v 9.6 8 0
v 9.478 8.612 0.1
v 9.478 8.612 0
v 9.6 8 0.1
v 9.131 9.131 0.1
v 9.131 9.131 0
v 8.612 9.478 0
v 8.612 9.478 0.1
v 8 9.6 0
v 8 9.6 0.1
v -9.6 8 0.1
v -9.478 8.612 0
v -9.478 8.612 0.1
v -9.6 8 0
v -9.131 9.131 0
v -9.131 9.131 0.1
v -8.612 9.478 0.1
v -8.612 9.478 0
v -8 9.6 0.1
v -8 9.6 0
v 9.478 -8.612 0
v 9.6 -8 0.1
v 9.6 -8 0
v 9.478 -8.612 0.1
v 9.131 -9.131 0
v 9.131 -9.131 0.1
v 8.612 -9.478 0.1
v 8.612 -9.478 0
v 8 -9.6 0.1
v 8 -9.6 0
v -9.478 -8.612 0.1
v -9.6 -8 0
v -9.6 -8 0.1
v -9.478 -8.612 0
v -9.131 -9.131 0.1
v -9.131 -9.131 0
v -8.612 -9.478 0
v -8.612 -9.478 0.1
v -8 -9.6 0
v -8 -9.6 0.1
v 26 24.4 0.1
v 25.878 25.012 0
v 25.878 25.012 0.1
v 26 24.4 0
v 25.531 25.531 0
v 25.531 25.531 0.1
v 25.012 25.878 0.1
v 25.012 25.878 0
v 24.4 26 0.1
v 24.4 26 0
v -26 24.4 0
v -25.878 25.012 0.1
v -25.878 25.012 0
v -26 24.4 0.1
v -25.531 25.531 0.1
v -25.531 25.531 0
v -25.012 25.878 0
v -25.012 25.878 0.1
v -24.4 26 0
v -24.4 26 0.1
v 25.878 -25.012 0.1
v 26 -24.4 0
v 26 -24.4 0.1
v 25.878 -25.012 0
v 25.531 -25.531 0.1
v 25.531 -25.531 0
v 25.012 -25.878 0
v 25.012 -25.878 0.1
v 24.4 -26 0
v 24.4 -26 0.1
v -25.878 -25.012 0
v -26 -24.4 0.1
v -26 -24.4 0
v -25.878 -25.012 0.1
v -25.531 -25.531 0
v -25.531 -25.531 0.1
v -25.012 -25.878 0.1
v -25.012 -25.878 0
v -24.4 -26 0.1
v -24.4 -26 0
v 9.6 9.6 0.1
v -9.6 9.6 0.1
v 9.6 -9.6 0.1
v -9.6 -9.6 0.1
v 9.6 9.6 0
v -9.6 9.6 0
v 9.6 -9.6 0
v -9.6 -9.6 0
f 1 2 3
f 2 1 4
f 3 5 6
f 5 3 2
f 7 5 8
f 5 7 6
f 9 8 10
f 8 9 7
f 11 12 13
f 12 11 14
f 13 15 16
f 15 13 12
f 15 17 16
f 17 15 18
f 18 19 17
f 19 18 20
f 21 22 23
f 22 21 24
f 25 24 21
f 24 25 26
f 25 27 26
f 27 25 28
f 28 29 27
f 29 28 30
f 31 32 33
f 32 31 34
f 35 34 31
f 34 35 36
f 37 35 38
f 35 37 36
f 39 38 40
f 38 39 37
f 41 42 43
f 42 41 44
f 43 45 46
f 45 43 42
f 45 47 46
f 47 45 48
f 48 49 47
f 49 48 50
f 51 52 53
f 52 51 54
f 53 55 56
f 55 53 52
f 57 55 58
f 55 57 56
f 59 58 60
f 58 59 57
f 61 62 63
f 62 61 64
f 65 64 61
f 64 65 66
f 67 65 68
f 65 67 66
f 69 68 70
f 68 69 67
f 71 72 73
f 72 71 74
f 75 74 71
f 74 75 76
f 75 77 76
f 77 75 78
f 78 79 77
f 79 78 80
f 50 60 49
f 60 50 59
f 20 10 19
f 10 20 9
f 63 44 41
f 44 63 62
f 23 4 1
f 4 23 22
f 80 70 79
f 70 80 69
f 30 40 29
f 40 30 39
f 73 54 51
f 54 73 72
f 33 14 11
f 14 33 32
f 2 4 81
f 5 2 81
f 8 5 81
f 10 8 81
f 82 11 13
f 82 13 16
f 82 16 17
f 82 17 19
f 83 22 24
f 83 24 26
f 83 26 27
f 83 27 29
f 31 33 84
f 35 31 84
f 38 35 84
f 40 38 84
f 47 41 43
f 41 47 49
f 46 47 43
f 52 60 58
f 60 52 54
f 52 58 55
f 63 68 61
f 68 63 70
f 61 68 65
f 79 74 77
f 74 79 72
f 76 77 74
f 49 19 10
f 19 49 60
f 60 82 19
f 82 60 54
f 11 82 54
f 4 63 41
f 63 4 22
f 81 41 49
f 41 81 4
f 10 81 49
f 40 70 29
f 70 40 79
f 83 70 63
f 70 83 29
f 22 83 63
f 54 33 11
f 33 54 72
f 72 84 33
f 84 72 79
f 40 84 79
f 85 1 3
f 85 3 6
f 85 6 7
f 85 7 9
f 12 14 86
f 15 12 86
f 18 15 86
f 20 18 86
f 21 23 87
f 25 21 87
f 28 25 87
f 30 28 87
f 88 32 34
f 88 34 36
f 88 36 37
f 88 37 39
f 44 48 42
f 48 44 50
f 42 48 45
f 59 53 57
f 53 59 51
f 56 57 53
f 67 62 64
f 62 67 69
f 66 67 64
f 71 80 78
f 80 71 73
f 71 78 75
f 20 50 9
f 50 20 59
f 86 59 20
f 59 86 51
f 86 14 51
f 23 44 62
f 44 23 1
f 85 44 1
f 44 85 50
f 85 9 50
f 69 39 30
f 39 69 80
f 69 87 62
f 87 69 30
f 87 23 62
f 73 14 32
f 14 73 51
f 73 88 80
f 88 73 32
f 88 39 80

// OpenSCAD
// file: ../p/4-4edge.scad
use <../lib.scad>
$fa=1; $fs=0.2;
function ldraw_lib__4_4edge(realsolid=false) = [
// 0 Circle 1.0
// 0 Name: 4-4edge.dat
// 0 Author: James Jessiman
// 0 !LDRAW_ORG Primitive UPDATE 2017-01
// 0 !LICENSE Licensed under CC BY 2.0 and CC BY 4.0 : see CAreadme.txt
// 
// 0 BFC CERTIFY CCW
  [0,"BFC","CERTIFY"],
  [0,"BFC","CCW"],
// 
// 0 !HISTORY 1998-12-15 [PTadmin] Official Update 1998-10
// 0 !HISTORY 2005-12-28 [PTadmin] Official Update 2005-01
// 0 !HISTORY 2007-06-24 [PTadmin] Header formatted for Contributor Agreement
// 0 !HISTORY 2008-07-01 [PTadmin] Official Update 2008-01
// 0 !HISTORY 2017-01-15 [Steffen] BFCed
// 0 !HISTORY 2017-12-30 [PTadmin] Official Update 2017-01
// 
// 
// 2 24 1 0 0 0.9239 0 0.3827
  [2,24,1,0,0,0.9239,0,0.3827],
// 2 24 0.9239 0 0.3827 0.7071 0 0.7071
  [2,24,0.9239,0,0.3827,0.7071,0,0.7071],
// 2 24 0.7071 0 0.7071 0.3827 0 0.9239
  [2,24,0.7071,0,0.7071,0.3827,0,0.9239],
// 2 24 0.3827 0 0.9239 0 0 1
  [2,24,0.3827,0,0.9239,0,0,1],
// 2 24 0 0 1 -0.3827 0 0.9239
  [2,24,0,0,1,-0.3827,0,0.9239],
// 2 24 -0.3827 0 0.9239 -0.7071 0 0.7071
  [2,24,-0.3827,0,0.9239,-0.7071,0,0.7071],
// 2 24 -0.7071 0 0.7071 -0.9239 0 0.3827
  [2,24,-0.7071,0,0.7071,-0.9239,0,0.3827],
// 2 24 -0.9239 0 0.3827 -1 0 -0
  [2,24,-0.9239,0,0.3827,-1,0,-0],
// 2 24 -1 0 -0 -0.9239 0 -0.3827
  [2,24,-1,0,-0,-0.9239,0,-0.3827],
// 2 24 -0.9239 0 -0.3827 -0.7071 0 -0.7071
  [2,24,-0.9239,0,-0.3827,-0.7071,0,-0.7071],
// 2 24 -0.7071 0 -0.7071 -0.3827 0 -0.9239
  [2,24,-0.7071,0,-0.7071,-0.3827,0,-0.9239],
// 2 24 -0.3827 0 -0.9239 0 0 -1
  [2,24,-0.3827,0,-0.9239,0,0,-1],
// 2 24 0 0 -1 0.3827 0 -0.9239
  [2,24,0,0,-1,0.3827,0,-0.9239],
// 2 24 0.3827 0 -0.9239 0.7071 0 -0.7071
  [2,24,0.3827,0,-0.9239,0.7071,0,-0.7071],
// 2 24 0.7071 0 -0.7071 0.9239 0 -0.3827
  [2,24,0.7071,0,-0.7071,0.9239,0,-0.3827],
// 2 24 0.9239 0 -0.3827 1 0 0
  [2,24,0.9239,0,-0.3827,1,0,0],
];
module ldraw_lib__4_4edge(step=0, col=false, unit=2/5, alt=false, line=0.2, solid=!$preview)
    makepoly(ldraw_lib__4_4edge(solid), step=step, col=col, unit=unit, alt=alt, line=line, solid=solid);
ldraw_lib__4_4edge(line=0.2);
// file: ../p/4-4disc.scad
use <../lib.scad>
$fa=1; $fs=0.2;
function ldraw_lib__4_4disc(realsolid=false) = [
// 0 Disc 1.0
// 0 Name: 4-4disc.dat
// 0 Author: James Jessiman
// 0 !LDRAW_ORG Primitive UPDATE 2002-02
// 0 !LICENSE Licensed under CC BY 2.0 and CC BY 4.0 : see CAreadme.txt
// 
// 0 BFC CERTIFY CCW
  [0,"BFC","CERTIFY"],
  [0,"BFC","CCW"],
// 
// 0 !HISTORY 1998-12-15 [PTadmin] Official Update 1998-10
// 0 !HISTORY 2002-03-23 [sbliss] Added BFC statement
// 0 !HISTORY 2002-04-25 [PTadmin] Official Update 2002-02
// 0 !HISTORY 2007-06-24 [PTadmin] Header formatted for Contributor Agreement
// 0 !HISTORY 2008-07-01 [PTadmin] Official Update 2008-01
// 
// 
// 3 16 0 0 0 1 0 0 0.9239 0 0.3827
  [3,16,0,0,0,1,0,0,0.9239,0,0.3827],
// 3 16 0 0 0 0.9239 0 0.3827 0.7071 0 0.7071
  [3,16,0,0,0,0.9239,0,0.3827,0.7071,0,0.7071],
// 3 16 0 0 0 0.7071 0 0.7071 0.3827 0 0.9239
  [3,16,0,0,0,0.7071,0,0.7071,0.3827,0,0.9239],
// 3 16 0 0 0 0.3827 0 0.9239 0 0 1
  [3,16,0,0,0,0.3827,0,0.9239,0,0,1],
// 3 16 0 0 0 0 0 1 -0.3827 0 0.9239
  [3,16,0,0,0,0,0,1,-0.3827,0,0.9239],
// 3 16 0 0 0 -0.3827 0 0.9239 -0.7071 0 0.7071
  [3,16,0,0,0,-0.3827,0,0.9239,-0.7071,0,0.7071],
// 3 16 0 0 0 -0.7071 0 0.7071 -0.9239 0 0.3827
  [3,16,0,0,0,-0.7071,0,0.7071,-0.9239,0,0.3827],
// 3 16 0 0 0 -0.9239 0 0.3827 -1 0 -0
  [3,16,0,0,0,-0.9239,0,0.3827,-1,0,-0],
// 3 16 0 0 0 -1 0 -0 -0.9239 0 -0.3827
  [3,16,0,0,0,-1,0,-0,-0.9239,0,-0.3827],
// 3 16 0 0 0 -0.9239 0 -0.3827 -0.7071 0 -0.7071
  [3,16,0,0,0,-0.9239,0,-0.3827,-0.7071,0,-0.7071],
// 3 16 0 0 0 -0.7071 0 -0.7071 -0.3827 0 -0.9239
  [3,16,0,0,0,-0.7071,0,-0.7071,-0.3827,0,-0.9239],
// 3 16 0 0 0 -0.3827 0 -0.9239 0 0 -1
  [3,16,0,0,0,-0.3827,0,-0.9239,0,0,-1],
// 3 16 0 0 0 0 0 -1 0.3827 0 -0.9239
  [3,16,0,0,0,0,0,-1,0.3827,0,-0.9239],
// 3 16 0 0 0 0.3827 0 -0.9239 0.7071 0 -0.7071
  [3,16,0,0,0,0.3827,0,-0.9239,0.7071,0,-0.7071],
// 3 16 0 0 0 0.7071 0 -0.7071 0.9239 0 -0.3827
  [3,16,0,0,0,0.7071,0,-0.7071,0.9239,0,-0.3827],
// 3 16 0 0 0 0.9239 0 -0.3827 1 0 0
  [3,16,0,0,0,0.9239,0,-0.3827,1,0,0],
// 0
];
module ldraw_lib__4_4disc(step=0, col=false, unit=2/5, alt=false, line=0.2, solid=!$preview)
    makepoly(ldraw_lib__4_4disc(solid), step=step, col=col, unit=unit, alt=alt, line=line, solid=solid);
ldraw_lib__4_4disc(line=0.2);
// file: ../p/4-4cyli.scad
use <../lib.scad>
$fa=1; $fs=0.2;
function ldraw_lib__4_4cyli(realsolid=false) = [
// 0 Cylinder 1.0
// 0 Name: 4-4cyli.dat
// 0 Author: James Jessiman
// 0 !LDRAW_ORG Primitive UPDATE 2005-01
// 0 !LICENSE Licensed under CC BY 2.0 and CC BY 4.0 : see CAreadme.txt
// 
// 0 BFC CERTIFY CCW
  [0,"BFC","CERTIFY"],
  [0,"BFC","CCW"],
// 
// 0 !HISTORY 1998-12-15 [PTadmin] Official Update 1998-10
// 0 !HISTORY 2002-03-23 [sbliss] Added BFC statement; merged headers from files in distributions LDraw 0.27 and Complete.
// 0 !HISTORY 2002-04-25 [PTadmin] Official Update 2002-02
// 0 !HISTORY 2004-12-14 [guyvivan] BFC CCW
// 0 !HISTORY 2005-12-28 [PTadmin] Official Update 2005-01
// 0 !HISTORY 2007-06-24 [PTadmin] Header formatted for Contributor Agreement
// 0 !HISTORY 2008-07-01 [PTadmin] Official Update 2008-01
// 
// 
// 4 16 1 1 0 0.9239 1 0.3827 0.9239 0 0.3827 1 0 0
  [4,16,1,1,0,0.9239,1,0.3827,0.9239,0,0.3827,1,0,0],
// 5 24 1 0 0 1 1 0 0.9239 0 0.3827 0.9239 0 -0.3827
  [5,24,1,0,0,1,1,0,0.9239,0,0.3827,0.9239,0,-0.3827],
// 4 16 0.9239 1 0.3827 0.7071 1 0.7071 0.7071 0 0.7071 0.9239 0 0.3827
  [4,16,0.9239,1,0.3827,0.7071,1,0.7071,0.7071,0,0.7071,0.9239,0,0.3827],
// 5 24 0.9239 0 0.3827 0.9239 1 0.3827 0.7071 0 0.7071 1 0 0
  [5,24,0.9239,0,0.3827,0.9239,1,0.3827,0.7071,0,0.7071,1,0,0],
// 4 16 0.7071 1 0.7071 0.3827 1 0.9239 0.3827 0 0.9239 0.7071 0 0.7071
  [4,16,0.7071,1,0.7071,0.3827,1,0.9239,0.3827,0,0.9239,0.7071,0,0.7071],
// 5 24 0.7071 0 0.7071 0.7071 1 0.7071 0.3827 0 0.9239 0.9239 0 0.3827
  [5,24,0.7071,0,0.7071,0.7071,1,0.7071,0.3827,0,0.9239,0.9239,0,0.3827],
// 4 16 0.3827 1 0.9239 0 1 1 0 0 1 0.3827 0 0.9239
  [4,16,0.3827,1,0.9239,0,1,1,0,0,1,0.3827,0,0.9239],
// 5 24 0.3827 0 0.9239 0.3827 1 0.9239 0 0 1 0.7071 0 0.7071
  [5,24,0.3827,0,0.9239,0.3827,1,0.9239,0,0,1,0.7071,0,0.7071],
// 4 16 0 1 1 -0.3827 1 0.9239 -0.3827 0 0.9239 0 0 1
  [4,16,0,1,1,-0.3827,1,0.9239,-0.3827,0,0.9239,0,0,1],
// 5 24 0 0 1 0 1 1 -0.3827 0 0.9239 0.3827 0 0.9239
  [5,24,0,0,1,0,1,1,-0.3827,0,0.9239,0.3827,0,0.9239],
// 4 16 -0.3827 1 0.9239 -0.7071 1 0.7071 -0.7071 0 0.7071 -0.3827 0 0.9239
  [4,16,-0.3827,1,0.9239,-0.7071,1,0.7071,-0.7071,0,0.7071,-0.3827,0,0.9239],
// 5 24 -0.3827 0 0.9239 -0.3827 1 0.9239 -0.7071 0 0.7071 0 0 1
  [5,24,-0.3827,0,0.9239,-0.3827,1,0.9239,-0.7071,0,0.7071,0,0,1],
// 4 16 -0.7071 1 0.7071 -0.9239 1 0.3827 -0.9239 0 0.3827 -0.7071 0 0.7071
  [4,16,-0.7071,1,0.7071,-0.9239,1,0.3827,-0.9239,0,0.3827,-0.7071,0,0.7071],
// 5 24 -0.7071 0 0.7071 -0.7071 1 0.7071 -0.9239 0 0.3827 -0.3827 0 0.9239
  [5,24,-0.7071,0,0.7071,-0.7071,1,0.7071,-0.9239,0,0.3827,-0.3827,0,0.9239],
// 4 16 -0.9239 1 0.3827 -1 1 0 -1 0 0 -0.9239 0 0.3827
  [4,16,-0.9239,1,0.3827,-1,1,0,-1,0,0,-0.9239,0,0.3827],
// 5 24 -0.9239 0 0.3827 -0.9239 1 0.3827 -1 0 0 -0.7071 0 0.7071
  [5,24,-0.9239,0,0.3827,-0.9239,1,0.3827,-1,0,0,-0.7071,0,0.7071],
// 4 16 -1 1 0 -0.9239 1 -0.3827 -0.9239 0 -0.3827 -1 0 0
  [4,16,-1,1,0,-0.9239,1,-0.3827,-0.9239,0,-0.3827,-1,0,0],
// 5 24 -1 0 0 -1 1 0 -0.9239 0 -0.3827 -0.9239 0 0.3827
  [5,24,-1,0,0,-1,1,0,-0.9239,0,-0.3827,-0.9239,0,0.3827],
// 4 16 -0.9239 1 -0.3827 -0.7071 1 -0.7071 -0.7071 0 -0.7071 -0.9239 0 -0.3827
  [4,16,-0.9239,1,-0.3827,-0.7071,1,-0.7071,-0.7071,0,-0.7071,-0.9239,0,-0.3827],
// 5 24 -0.9239 0 -0.3827 -0.9239 1 -0.3827 -0.7071 0 -0.7071 -1 0 0
  [5,24,-0.9239,0,-0.3827,-0.9239,1,-0.3827,-0.7071,0,-0.7071,-1,0,0],
// 4 16 -0.7071 1 -0.7071 -0.3827 1 -0.9239 -0.3827 0 -0.9239 -0.7071 0 -0.7071
  [4,16,-0.7071,1,-0.7071,-0.3827,1,-0.9239,-0.3827,0,-0.9239,-0.7071,0,-0.7071],
// 5 24 -0.7071 0 -0.7071 -0.7071 1 -0.7071 -0.3827 0 -0.9239 -0.9239 0 -0.3827
  [5,24,-0.7071,0,-0.7071,-0.7071,1,-0.7071,-0.3827,0,-0.9239,-0.9239,0,-0.3827],
// 4 16 -0.3827 1 -0.9239 0 1 -1 0 0 -1 -0.3827 0 -0.9239
  [4,16,-0.3827,1,-0.9239,0,1,-1,0,0,-1,-0.3827,0,-0.9239],
// 5 24 -0.3827 0 -0.9239 -0.3827 1 -0.9239 0 0 -1 -0.7071 0 -0.7071
  [5,24,-0.3827,0,-0.9239,-0.3827,1,-0.9239,0,0,-1,-0.7071,0,-0.7071],
// 4 16 0 1 -1 0.3827 1 -0.9239 0.3827 0 -0.9239 0 0 -1
  [4,16,0,1,-1,0.3827,1,-0.9239,0.3827,0,-0.9239,0,0,-1],
// 5 24 0 0 -1 0 1 -1 0.3827 0 -0.9239 -0.3827 0 -0.9239
  [5,24,0,0,-1,0,1,-1,0.3827,0,-0.9239,-0.3827,0,-0.9239],
// 4 16 0.3827 1 -0.9239 0.7071 1 -0.7071 0.7071 0 -0.7071 0.3827 0 -0.9239
  [4,16,0.3827,1,-0.9239,0.7071,1,-0.7071,0.7071,0,-0.7071,0.3827,0,-0.9239],
// 5 24 0.3827 0 -0.9239 0.3827 1 -0.9239 0.7071 0 -0.7071 0 0 -1
  [5,24,0.3827,0,-0.9239,0.3827,1,-0.9239,0.7071,0,-0.7071,0,0,-1],
// 4 16 0.7071 1 -0.7071 0.9239 1 -0.3827 0.9239 0 -0.3827 0.7071 0 -0.7071
  [4,16,0.7071,1,-0.7071,0.9239,1,-0.3827,0.9239,0,-0.3827,0.7071,0,-0.7071],
// 5 24 0.7071 0 -0.7071 0.7071 1 -0.7071 0.9239 0 -0.3827 0.3827 0 -0.9239
  [5,24,0.7071,0,-0.7071,0.7071,1,-0.7071,0.9239,0,-0.3827,0.3827,0,-0.9239],
// 4 16 0.9239 1 -0.3827 1 1 0 1 0 0 0.9239 0 -0.3827
  [4,16,0.9239,1,-0.3827,1,1,0,1,0,0,0.9239,0,-0.3827],
// 5 24 0.9239 0 -0.3827 0.9239 1 -0.3827 1 0 0 0.7071 0 -0.7071
  [5,24,0.9239,0,-0.3827,0.9239,1,-0.3827,1,0,0,0.7071,0,-0.7071],
// 0
];
module ldraw_lib__4_4cyli(step=0, col=false, unit=2/5, alt=false, line=0.2, solid=!$preview)
    makepoly(ldraw_lib__4_4cyli(solid), step=step, col=col, unit=unit, alt=alt, line=line, solid=solid);
ldraw_lib__4_4cyli(line=0.2);
// file: ../p/stud3.scad
use <../lib.scad>
use <4-4cyli.scad>
use <4-4disc.scad>
use <4-4edge.scad>
$fa=1; $fs=0.2;
function ldraw_lib__stud3(realsolid=false) = realsolid ? 
    [openscad(translate([0,0,-eps()], o=cylinder(4+eps(), r=4)),2)] : [
// 0 Stud Tube Solid
// 0 Name: stud3.dat
// 0 Author: James Jessiman
// 0 !LDRAW_ORG Primitive UPDATE 2012-01
// 0 !LICENSE Licensed under CC BY 2.0 and CC BY 4.0 : see CAreadme.txt
// 
// 0 BFC CERTIFY CCW
  [0,"BFC","CERTIFY"],
  [0,"BFC","CCW"],
// 
// 0 !HISTORY 2002-04-04 [sbliss] Modified for BFC compliance
// 0 !HISTORY 2002-04-25 [PTadmin] Official Update 2002-02
// 0 !HISTORY 2007-06-24 [PTadmin] Header formatted for Contributor Agreement
// 0 !HISTORY 2008-07-01 [PTadmin] Official Update 2008-01
// 0 !HISTORY 2012-02-16 [Philo] Changed to CCW
// 0 !HISTORY 2012-03-30 [PTadmin] Official Update 2012-01
// 
// 
// 1 16 0 -4 0 4 0 0 0 1 0 0 0 4 4-4edge.dat
  [1,16,0,-4,0,4,0,0,0,1,0,0,0,4, ldraw_lib__4_4edge(realsolid)],
// 1 16 0 0 0 4 0 0 0 1 0 0 0 4 4-4edge.dat
  [1,16,0,0,0,4,0,0,0,1,0,0,0,4, ldraw_lib__4_4edge(realsolid)],
// 1 16 0 -4 0 4 0 0 0 1 0 0 0 4 4-4disc.dat
  [1,16,0,-4,0,4,0,0,0,1,0,0,0,4, ldraw_lib__4_4disc(realsolid)],
// 1 16 0 -4 0 4 0 0 0 4 0 0 0 4 4-4cyli.dat
  [1,16,0,-4,0,4,0,0,0,4,0,0,0,4, ldraw_lib__4_4cyli(realsolid)],
];
module ldraw_lib__stud3(step=0, col=false, unit=2/5, alt=false, line=0.2, solid=!$preview)
    makepoly(ldraw_lib__stud3(solid), step=step, col=col, unit=unit, alt=alt, line=line, solid=solid);
ldraw_lib__stud3(line=0.2);
// file: ../p/stud.scad
use <../lib.scad>
use <4-4cyli.scad>
use <4-4disc.scad>
use <4-4edge.scad>
$fa=1; $fs=0.2;
function ldraw_lib__stud(realsolid=false) = realsolid ? 
    [openscad(translate([0,0,-eps()], o=cylinder(4+eps(), r=6)),2)] : [
// 0 Stud
// 0 Name: stud.dat
// 0 Author: James Jessiman
// 0 !LDRAW_ORG Primitive UPDATE 2012-01
// 0 !LICENSE Licensed under CC BY 2.0 and CC BY 4.0 : see CAreadme.txt
// 
// 0 BFC CERTIFY CCW
  [0,"BFC","CERTIFY"],
  [0,"BFC","CCW"],
// 
// 0 !HISTORY 2002-04-04 [sbliss] Modified for BFC compliance
// 0 !HISTORY 2002-04-25 [PTadmin] Official Update 2002-02
// 0 !HISTORY 2007-06-24 [PTadmin] Header formatted for Contributor Agreement
// 0 !HISTORY 2008-07-01 [PTadmin] Official Update 2008-01
// 0 !HISTORY 2012-02-16 [Philo] Changed to CCW
// 0 !HISTORY 2012-03-30 [PTadmin] Official Update 2012-01
// 
// 
// 1 16 0 0 0 6 0 0 0 1 0 0 0 6 4-4edge.dat
  [1,16,0,0,0,6,0,0,0,1,0,0,0,6, ldraw_lib__4_4edge(realsolid)],
// 1 16 0 -4 0 6 0 0 0 1 0 0 0 6 4-4edge.dat
  [1,16,0,-4,0,6,0,0,0,1,0,0,0,6, ldraw_lib__4_4edge(realsolid)],
// 1 16 0 0 0 6 0 0 0 -4 0 0 0 6 4-4cyli.dat
  [1,16,0,0,0,6,0,0,0,-4,0,0,0,6, ldraw_lib__4_4cyli(realsolid)],
// 1 16 0 -4 0 6 0 0 0 1 0 0 0 6 4-4disc.dat
  [1,16,0,-4,0,6,0,0,0,1,0,0,0,6, ldraw_lib__4_4disc(realsolid)],
];
module ldraw_lib__stud(step=0, col=false, unit=2/5, alt=false, line=0.2, solid=!$preview)
    makepoly(ldraw_lib__stud(solid), step=step, col=col, unit=unit, alt=alt, line=line, solid=solid);
ldraw_lib__stud(line=0.2);
// file: ../p/box5.scad
use <../lib.scad>
$fa=1; $fs=0.2;
function ldraw_lib__box5(realsolid=false) = [
// 0 Box with 5 Faces and All Edges
// 0 Name: box5.dat
// 0 Author: James Jessiman
// 0 !LDRAW_ORG Primitive UPDATE 2012-01
// 0 !LICENSE Licensed under CC BY 2.0 and CC BY 4.0 : see CAreadme.txt
// 
// 0 BFC CERTIFY CCW
  [0,"BFC","CERTIFY"],
  [0,"BFC","CCW"],
// 
// 0 !HISTORY 2002-04-03 [sbliss] Modified for BFC compliance
// 0 !HISTORY 2002-04-25 [PTadmin] Official Update 2002-02
// 0 !HISTORY 2007-06-24 [PTadmin] Header formatted for Contributor Agreement
// 0 !HISTORY 2008-07-01 [PTadmin] Official Update 2008-01
// 0 !HISTORY 2012-02-16 [Philo] Changed to CCW
// 0 !HISTORY 2012-03-30 [PTadmin] Official Update 2012-01
// 
// 
// 2 24 1 1 1 -1 1 1
  [2,24,1,1,1,-1,1,1],
// 2 24 -1 1 1 -1 1 -1
  [2,24,-1,1,1,-1,1,-1],
// 2 24 -1 1 -1 1 1 -1
  [2,24,-1,1,-1,1,1,-1],
// 2 24 1 1 -1 1 1 1
  [2,24,1,1,-1,1,1,1],
// 2 24 1 0 1 -1 0 1
  [2,24,1,0,1,-1,0,1],
// 2 24 -1 0 1 -1 0 -1
  [2,24,-1,0,1,-1,0,-1],
// 2 24 -1 0 -1 1 0 -1
  [2,24,-1,0,-1,1,0,-1],
// 2 24 1 0 -1 1 0 1
  [2,24,1,0,-1,1,0,1],
// 2 24 1 0 1 1 1 1
  [2,24,1,0,1,1,1,1],
// 2 24 -1 0 1 -1 1 1
  [2,24,-1,0,1,-1,1,1],
// 2 24 1 0 -1 1 1 -1
  [2,24,1,0,-1,1,1,-1],
// 2 24 -1 0 -1 -1 1 -1
  [2,24,-1,0,-1,-1,1,-1],
// 4 16 -1 1 1 1 1 1 1 1 -1 -1 1 -1
  [4,16,-1,1,1,1,1,1,1,1,-1,-1,1,-1],
// 4 16 -1 1 1 -1 0 1 1 0 1 1 1 1
  [4,16,-1,1,1,-1,0,1,1,0,1,1,1,1],
// 4 16 -1 1 -1 -1 0 -1 -1 0 1 -1 1 1
  [4,16,-1,1,-1,-1,0,-1,-1,0,1,-1,1,1],
// 4 16 1 1 -1 1 0 -1 -1 0 -1 -1 1 -1
  [4,16,1,1,-1,1,0,-1,-1,0,-1,-1,1,-1],
// 4 16 1 1 1 1 0 1 1 0 -1 1 1 -1
  [4,16,1,1,1,1,0,1,1,0,-1,1,1,-1],
];
module ldraw_lib__box5(step=0, col=false, unit=2/5, alt=false, line=0.2, solid=!$preview)
    makepoly(ldraw_lib__box5(solid), step=step, col=col, unit=unit, alt=alt, line=line, solid=solid);
ldraw_lib__box5(line=0.2);
// file: ../p/box4t.scad
use <../lib.scad>
$fa=1; $fs=0.2;
function ldraw_lib__box4t(realsolid=false) = [
// 0 Box with 4 Adjacent Faces and All Edges
// 0 Name: box4t.dat
// 0 Author: Tore Eriksson [Tore_Eriksson]
// 0 !LDRAW_ORG Primitive UPDATE 2003-02
// 0 !LICENSE Licensed under CC BY 2.0 and CC BY 4.0 : see CAreadme.txt
// 
// 0 BFC CERTIFY CCW
  [0,"BFC","CERTIFY"],
  [0,"BFC","CCW"],
// 
// 0 !HISTORY 1997-09-29 [PTadmin] Official Update 1997-15
// 0 !HISTORY 2002-08-31 [izanette] Modified with WINDZ for BFC compliance
// 0 !HISTORY 2003-08-01 [PTadmin] Official Update 2003-02
// 0 !HISTORY 2007-06-24 [PTadmin] Header formatted for Contributor Agreement
// 0 !HISTORY 2008-07-01 [PTadmin] Official Update 2008-01
// 
// 
// 2 24 1 1 1 -1 1 1
  [2,24,1,1,1,-1,1,1],
// 2 24 -1 1 1 -1 1 -1
  [2,24,-1,1,1,-1,1,-1],
// 2 24 -1 1 -1 1 1 -1
  [2,24,-1,1,-1,1,1,-1],
// 2 24 1 1 -1 1 1 1
  [2,24,1,1,-1,1,1,1],
// 2 24 1 0 1 -1 0 1
  [2,24,1,0,1,-1,0,1],
// 2 24 -1 0 1 -1 0 -1
  [2,24,-1,0,1,-1,0,-1],
// 2 24 -1 0 -1 1 0 -1
  [2,24,-1,0,-1,1,0,-1],
// 2 24 1 0 -1 1 0 1
  [2,24,1,0,-1,1,0,1],
// 2 24 1 0 1 1 1 1
  [2,24,1,0,1,1,1,1],
// 2 24 -1 0 1 -1 1 1
  [2,24,-1,0,1,-1,1,1],
// 2 24 1 0 -1 1 1 -1
  [2,24,1,0,-1,1,1,-1],
// 2 24 -1 0 -1 -1 1 -1
  [2,24,-1,0,-1,-1,1,-1],
// 4 16 1 1 1 1 1 -1 -1 1 -1 -1 1 1
  [4,16,1,1,1,1,1,-1,-1,1,-1,-1,1,1],
// 4 16 1 1 1 -1 1 1 -1 0 1 1 0 1
  [4,16,1,1,1,-1,1,1,-1,0,1,1,0,1],
// 4 16 -1 1 1 -1 1 -1 -1 0 -1 -1 0 1
  [4,16,-1,1,1,-1,1,-1,-1,0,-1,-1,0,1],
// 0 4 16 -1 1 -1 -1 0 -1 1 0 -1 1 1 -1
// 4 16 1 1 -1 1 1 1 1 0 1 1 0 -1
  [4,16,1,1,-1,1,1,1,1,0,1,1,0,-1],
// 0
];
module ldraw_lib__box4t(step=0, col=false, unit=2/5, alt=false, line=0.2, solid=!$preview)
    makepoly(ldraw_lib__box4t(solid), step=step, col=col, unit=unit, alt=alt, line=line, solid=solid);
ldraw_lib__box4t(line=0.2);
// file: s/3004s01.scad
use <../../lib.scad>
use <../../p/box4t.scad>
use <../../p/box5.scad>
use <../../p/stud.scad>
use <../../p/stud3.scad>
$fa=1; $fs=0.2;
function ldraw_lib__s__3004s01(realsolid=false) = [
// 0 ~Brick  1 x  2 without Front Face
// 0 Name: s\3004s01.dat
// 0 Author: James Jessiman
// 0 !LDRAW_ORG Subpart UPDATE 2003-03
// 0 !LICENSE Licensed under CC BY 2.0 and CC BY 4.0 : see CAreadme.txt
// 
// 0 BFC CERTIFY CCW
  [0,"BFC","CERTIFY"],
  [0,"BFC","CCW"],
// 
// 0 !HISTORY 2003-09-07 [jriley] Subfiling, BFC
// 0 !HISTORY 2003-12-19 [PTadmin] Official Update 2003-03
// 0 !HISTORY 2007-08-29 [PTadmin] Header formatted for Contributor Agreement
// 0 !HISTORY 2008-07-01 [PTadmin] Official Update 2008-01
// 
// 
// 1 16 0 4 0 1 0 0 0 -5 0 0 0 1 stud3.dat
  [1,16,0,4,0,1,0,0,0,-5,0,0,0,1, ldraw_lib__stud3(realsolid)],
// 0 BFC INVERTNEXT
  [0,"BFC","INVERTNEXT"],
// 1 16 0 24 0 16 0 0 0 -20 0 0 0 6 box5.dat
  [1,16,0,24,0,16,0,0,0,-20,0,0,0,6, ldraw_lib__box5(realsolid)],
// 4 16 20 24 10 16 24 6 -16 24 6 -20 24 10
  [4,16,20,24,10,16,24,6,-16,24,6,-20,24,10],
// 4 16 -20 24 10 -16 24 6 -16 24 -6 -20 24 -10
  [4,16,-20,24,10,-16,24,6,-16,24,-6,-20,24,-10],
// 4 16 -20 24 -10 -16 24 -6 16 24 -6 20 24 -10
  [4,16,-20,24,-10,-16,24,-6,16,24,-6,20,24,-10],
// 4 16 20 24 -10 16 24 -6 16 24 6 20 24 10
  [4,16,20,24,-10,16,24,-6,16,24,6,20,24,10],
// 1 16 0 24 0 20 0 0 0 -24 0 0 0 10 box4t.dat
  [1,16,0,24,0,20,0,0,0,-24,0,0,0,10, ldraw_lib__box4t(realsolid)],
// 1 16 10 0 0 1 0 0 0 1 0 0 0 1 stud.dat
  [1,16,10,0,0,1,0,0,0,1,0,0,0,1, ldraw_lib__stud(realsolid)],
// 1 16 -10 0 0 1 0 0 0 1 0 0 0 1 stud.dat
  [1,16,-10,0,0,1,0,0,0,1,0,0,0,1, ldraw_lib__stud(realsolid)],
// 0
];
module ldraw_lib__s__3004s01(step=0, col=false, unit=2/5, alt=false, line=0.2, solid=!$preview)
    makepoly(ldraw_lib__s__3004s01(solid), step=step, col=col, unit=unit, alt=alt, line=line, solid=solid);
ldraw_lib__s__3004s01(line=0.2);
// file: ../p/1-4edge.scad
use <../lib.scad>
$fa=1; $fs=0.2;
function ldraw_lib__1_4edge(realsolid=false) = [
// 0 Circle 0.25
// 0 Name: 1-4edge.dat
// 0 Author: James Jessiman
// 0 !LDRAW_ORG Primitive UPDATE 2017-01
// 0 !LICENSE Licensed under CC BY 2.0 and CC BY 4.0 : see CAreadme.txt
// 
// 0 BFC CERTIFY CCW
  [0,"BFC","CERTIFY"],
  [0,"BFC","CCW"],
// 
// 0 !HISTORY 2007-06-22 [PTadmin] Header formatted for Contributor Agreement
// 0 !HISTORY 2008-07-01 [PTadmin] Official Update 2008-01
// 0 !HISTORY 2017-01-15 [Steffen] BFCed
// 0 !HISTORY 2017-12-30 [PTadmin] Official Update 2017-01
// 
// 
// 2 24 1 0 0 0.9239 0 0.3827
  [2,24,1,0,0,0.9239,0,0.3827],
// 2 24 0.9239 0 0.3827 0.7071 0 0.7071
  [2,24,0.9239,0,0.3827,0.7071,0,0.7071],
// 2 24 0.7071 0 0.7071 0.3827 0 0.9239
  [2,24,0.7071,0,0.7071,0.3827,0,0.9239],
// 2 24 0.3827 0 0.9239 0 0 1
  [2,24,0.3827,0,0.9239,0,0,1],
];
module ldraw_lib__1_4edge(step=0, col=false, unit=2/5, alt=false, line=0.2, solid=!$preview)
    makepoly(ldraw_lib__1_4edge(solid), step=step, col=col, unit=unit, alt=alt, line=line, solid=solid);
ldraw_lib__1_4edge(line=0.2);
// file: ../p/1-4cyli.scad
use <../lib.scad>
$fa=1; $fs=0.2;
function ldraw_lib__1_4cyli(realsolid=false) = [
// 0 Cylinder 0.25
// 0 Name: 1-4cyli.dat
// 0 Author: James Jessiman
// 0 !LDRAW_ORG Primitive UPDATE 2012-01
// 0 !LICENSE Licensed under CC BY 2.0 and CC BY 4.0 : see CAreadme.txt
// 
// 0 BFC CERTIFY CCW
  [0,"BFC","CERTIFY"],
  [0,"BFC","CCW"],
// 
// 0 !HISTORY 2002-03-23 [sbliss] Added BFC statement.
// 0 !HISTORY 2002-04-25 [PTadmin] Official Update 2002-02
// 0 !HISTORY 2007-06-22 [PTadmin] Header formatted for Contributor Agreement
// 0 !HISTORY 2008-07-01 [PTadmin] Official Update 2008-01
// 0 !HISTORY 2012-02-16 [Philo] Changed to CCW
// 0 !HISTORY 2012-03-30 [PTadmin] Official Update 2012-01
// 
// 
// 4 16 1 1 0 0.9239 1 0.3827 0.9239 0 0.3827 1 0 0
  [4,16,1,1,0,0.9239,1,0.3827,0.9239,0,0.3827,1,0,0],
// 5 24 1 0 0 1 1 0 0.9239 0 0.3827 1 0 -1
  [5,24,1,0,0,1,1,0,0.9239,0,0.3827,1,0,-1],
// 4 16 0.9239 1 0.3827 0.7071 1 0.7071 0.7071 0 0.7071 0.9239 0 0.3827
  [4,16,0.9239,1,0.3827,0.7071,1,0.7071,0.7071,0,0.7071,0.9239,0,0.3827],
// 5 24 0.9239 0 0.3827 0.9239 1 0.3827 0.7071 0 0.7071 1 0 0
  [5,24,0.9239,0,0.3827,0.9239,1,0.3827,0.7071,0,0.7071,1,0,0],
// 4 16 0.7071 1 0.7071 0.3827 1 0.9239 0.3827 0 0.9239 0.7071 0 0.7071
  [4,16,0.7071,1,0.7071,0.3827,1,0.9239,0.3827,0,0.9239,0.7071,0,0.7071],
// 5 24 0.7071 0 0.7071 0.7071 1 0.7071 0.3827 0 0.9239 0.9239 0 0.3827
  [5,24,0.7071,0,0.7071,0.7071,1,0.7071,0.3827,0,0.9239,0.9239,0,0.3827],
// 4 16 0.3827 1 0.9239 0 1 1 0 0 1 0.3827 0 0.9239
  [4,16,0.3827,1,0.9239,0,1,1,0,0,1,0.3827,0,0.9239],
// 5 24 0.3827 0 0.9239 0.3827 1 0.9239 0 0 1 0.7071 0 0.7071
  [5,24,0.3827,0,0.9239,0.3827,1,0.9239,0,0,1,0.7071,0,0.7071],
// 5 24 0 0 1 0 1 1 0.3827 0 0.9239 -1 0 1
  [5,24,0,0,1,0,1,1,0.3827,0,0.9239,-1,0,1],
];
module ldraw_lib__1_4cyli(step=0, col=false, unit=2/5, alt=false, line=0.2, solid=!$preview)
    makepoly(ldraw_lib__1_4cyli(solid), step=step, col=col, unit=unit, alt=alt, line=line, solid=solid);
ldraw_lib__1_4cyli(line=0.2);
// file: 3004.scad
use <../lib.scad>
use <s/3004s01.scad>
$fa=1; $fs=0.2;
function ldraw_lib__3004(realsolid=false) = [
// 0 Brick  1 x  2
// 0 Name: 3004.dat
// 0 Author: James Jessiman
// 0 !LDRAW_ORG Part UPDATE 2022-05
// 0 !LICENSE Licensed under CC BY 2.0 and CC BY 4.0 : see CAreadme.txt
// 
// 0 BFC CERTIFY CCW
  [0,"BFC","CERTIFY"],
  [0,"BFC","CCW"],
// 
// 0 !HISTORY 2001-10-26 [PTadmin] Official Update 2001-01
// 0 !HISTORY 2002-05-07 {unknown} BFC Certification
// 0 !HISTORY 2002-06-11 [PTadmin] Official Update 2002-03
// 0 !HISTORY 2007-05-07 [PTadmin] Header formatted for Contributor Agreement
// 0 !HISTORY 2008-07-01 [PTadmin] Official Update 2008-01
// 0 !HISTORY 2022-08-04 [MagFors] Using subfile
// 0 !HISTORY 2022-09-15 [PTadmin] Official Update 2022-05
// 
// 
// 1 16 0 0 0 1 0 0 0 1 0 0 0 1 s\3004s01.dat
  [1,16,0,0,0,1,0,0,0,1,0,0,0,1, ldraw_lib__s__3004s01(realsolid)],
// 4 16 -20 24 -10 20 24 -10 20 0 -10 -20 0 -10
  [4,16,-20,24,-10,20,24,-10,20,0,-10,-20,0,-10],
];
module ldraw_lib__3004(step=0, col=false, unit=2/5, alt=false, line=0.2, solid=!$preview)
    makepoly(ldraw_lib__3004(solid), step=step, col=col, unit=unit, alt=alt, line=line, solid=solid);
ldraw_lib__3004(line=0.2);
// file: ../p/rect2p.scad
use <../lib.scad>
$fa=1; $fs=0.2;
function ldraw_lib__rect2p(realsolid=false) = [
// 0 Rectangle with 2 Parallel Edges
// 0 Name: rect2p.dat
// 0 Author: Donald Sutter [technog]
// 0 !LDRAW_ORG Primitive UPDATE 2010-01
// 0 !LICENSE Licensed under CC BY 2.0 and CC BY 4.0 : see CAreadme.txt
// 
// 0 BFC CERTIFY CCW
  [0,"BFC","CERTIFY"],
  [0,"BFC","CCW"],
// 
// 0 !HISTORY 2003-08-01 [PTadmin] Official Update 2003-02
// 0 !HISTORY 2007-06-24 [PTadmin] Header formatted for Contributor Agreement
// 0 !HISTORY 2008-07-01 [PTadmin] Official Update 2008-01
// 0 !HISTORY 2010-01-17 [mikeheide] changed winding to CCW
// 0 !HISTORY 2010-04-05 [PTadmin] Official Update 2010-01
// 
// 
// 2 24 1 0 1 -1 0 1
  [2,24,1,0,1,-1,0,1],
// 2 24 -1 0 -1 1 0 -1
  [2,24,-1,0,-1,1,0,-1],
// 4 16 -1 0 1 -1 0 -1 1 0 -1 1 0 1
  [4,16,-1,0,1,-1,0,-1,1,0,-1,1,0,1],
// 0
];
module ldraw_lib__rect2p(step=0, col=false, unit=2/5, alt=false, line=0.2, solid=!$preview)
    makepoly(ldraw_lib__rect2p(solid), step=step, col=col, unit=unit, alt=alt, line=line, solid=solid);
ldraw_lib__rect2p(line=0.2);
// file: ../p/1-4ndis.scad
use <../lib.scad>
$fa=1; $fs=0.2;
function ldraw_lib__1_4ndis(realsolid=false) = [
// 0 Disc Negative 0.25
// 0 Name: 1-4ndis.dat
// 0 Author: James Jessiman
// 0 !LDRAW_ORG Primitive UPDATE 2012-01
// 0 !LICENSE Licensed under CC BY 2.0 and CC BY 4.0 : see CAreadme.txt
// 
// 0 BFC CERTIFY CCW
  [0,"BFC","CERTIFY"],
  [0,"BFC","CCW"],
// 
// 0 !HISTORY 2002-03-23 [sbliss] Added BFC Statement
// 0 !HISTORY 2002-04-25 [PTadmin] Official Update 2002-02
// 0 !HISTORY 2007-06-22 [PTadmin] Header formatted for Contributor Agreement
// 0 !HISTORY 2008-07-01 [PTadmin] Official Update 2008-01
// 0 !HISTORY 2012-02-16 [Philo] Changed to CCW
// 0 !HISTORY 2012-03-30 [PTadmin] Official Update 2012-01
// 
// 
// 3 16 0.9239 0 0.3827 1 0 0 1 0 1
  [3,16,0.9239,0,0.3827,1,0,0,1,0,1],
// 3 16 0.7071 0 0.7071 0.9239 0 0.3827 1 0 1
  [3,16,0.7071,0,0.7071,0.9239,0,0.3827,1,0,1],
// 3 16 0.3827 0 0.9239 0.7071 0 0.7071 1 0 1
  [3,16,0.3827,0,0.9239,0.7071,0,0.7071,1,0,1],
// 3 16 0 0 1 0.3827 0 0.9239 1 0 1
  [3,16,0,0,1,0.3827,0,0.9239,1,0,1],
];
module ldraw_lib__1_4ndis(step=0, col=false, unit=2/5, alt=false, line=0.2, solid=!$preview)
    makepoly(ldraw_lib__1_4ndis(solid), step=step, col=col, unit=unit, alt=alt, line=line, solid=solid);
ldraw_lib__1_4ndis(line=0.2);
// file: ../p/1-4cylo.scad
use <../lib.scad>
use <1-4cyli.scad>
use <1-4edge.scad>
$fa=1; $fs=0.2;
function ldraw_lib__1_4cylo(realsolid=false) = [
// 0 Cylinder Open 0.25
// 0 Name: 1-4cylo.dat
// 0 Author: Max Martin Richter [MMR1988]
// 0 !LDRAW_ORG Primitive UPDATE 2010-03
// 0 !LICENSE Licensed under CC BY 2.0 and CC BY 4.0 : see CAreadme.txt
// 
// 0 BFC CERTIFY CCW
  [0,"BFC","CERTIFY"],
  [0,"BFC","CCW"],
// 
// 0 !HISTORY 2010-12-31 [PTadmin] Official Update 2010-03
// 
// 
// 1 16 0 0 0 1 0 0 0 1 0 0 0 1 1-4edge.dat
  [1,16,0,0,0,1,0,0,0,1,0,0,0,1, ldraw_lib__1_4edge(realsolid)],
// 1 16 0 1 0 1 0 0 0 1 0 0 0 1 1-4edge.dat
  [1,16,0,1,0,1,0,0,0,1,0,0,0,1, ldraw_lib__1_4edge(realsolid)],
// 1 16 0 0 0 1 0 0 0 1 0 0 0 1 1-4cyli.dat
  [1,16,0,0,0,1,0,0,0,1,0,0,0,1, ldraw_lib__1_4cyli(realsolid)],
];
module ldraw_lib__1_4cylo(step=0, col=false, unit=2/5, alt=false, line=0.2, solid=!$preview)
    makepoly(ldraw_lib__1_4cylo(solid), step=step, col=col, unit=unit, alt=alt, line=line, solid=solid);
ldraw_lib__1_4cylo(line=0.2);
// file: ../p/1-4chrd.scad
use <../lib.scad>
$fa=1; $fs=0.2;
function ldraw_lib__1_4chrd(realsolid=false) = [
// 0 Chord 0.25
// 0 Name: 1-4chrd.dat
// 0 Author: Tony Hafner [hafhead]
// 0 !LDRAW_ORG Primitive UPDATE 2012-02
// 0 !LICENSE Licensed under CC BY 2.0 and CC BY 4.0 : see CAreadme.txt
// 
// 0 BFC CERTIFY CCW
  [0,"BFC","CERTIFY"],
  [0,"BFC","CCW"],
// 
// 0 !HISTORY 2004-04-22 [PTadmin] Official Update 2004-02
// 0 !HISTORY 2007-10-09 [PTadmin] Header formatted for Contributor Agreement
// 0 !HISTORY 2008-07-01 [PTadmin] Official Update 2008-01
// 0 !HISTORY 2012-08-02 [MMR1988] Re-creation with PrimGen2 and Rectifier
// 0 !HISTORY 2012-08-09 [PTadmin] Official Update 2012-02
// 
// 
// 4 16 0.9239 0 0.3827 0.3827 0 0.9239 0 0 1 1 0 0
  [4,16,0.9239,0,0.3827,0.3827,0,0.9239,0,0,1,1,0,0],
// 3 16 0.7071 0 0.7071 0.3827 0 0.9239 0.9239 0 0.3827
  [3,16,0.7071,0,0.7071,0.3827,0,0.9239,0.9239,0,0.3827],
];
module ldraw_lib__1_4chrd(step=0, col=false, unit=2/5, alt=false, line=0.2, solid=!$preview)
    makepoly(ldraw_lib__1_4chrd(solid), step=step, col=col, unit=unit, alt=alt, line=line, solid=solid);
ldraw_lib__1_4chrd(line=0.2);
// main file
use <../lib.scad>
use <../p/1-4chrd.scad>
use <../p/1-4cylo.scad>
use <../p/1-4ndis.scad>
use <../p/rect2p.scad>
$fa=1; $fs=0.2;
function ldraw_lib__u9445(realsolid=false) = [
// 0 ~Sheet Plastic  6.5 x  6.5 Dualsided Adhesive Tape
// 0 Name: u9445.dat
// 0 Author: Magnus Forsberg [MagFors]
// 0 !LDRAW_ORG Part UPDATE 2023-01
// 0 !LICENSE Licensed under CC BY 2.0 and CC BY 4.0 : see CAreadme.txt
// 
// 0 BFC CERTIFY CCW
  [0,"BFC","CERTIFY"],
  [0,"BFC","CCW"],
// 
// 0 !CATEGORY Sheet Plastic
// 
// 0 !HISTORY 2023-03-05 [OrionP] Official Update 2023-01
// 
// 
// 0 BFC INVERTNEXT
  [0,"BFC","INVERTNEXT"],
// 1 16 20 -.25 20 4 0 0 0 .25 0 0 0 4 1-4cylo.dat
  [1,16,20,-.25,20,4,0,0,0,.25,0,0,0,4, ldraw_lib__1_4cylo(realsolid)],
// 0 BFC INVERTNEXT
  [0,"BFC","INVERTNEXT"],
// 1 16 -20 -.25 20 -4 0 0 0 .25 0 0 0 4 1-4cylo.dat
  [1,16,-20,-.25,20,-4,0,0,0,.25,0,0,0,4, ldraw_lib__1_4cylo(realsolid)],
// 0 BFC INVERTNEXT
  [0,"BFC","INVERTNEXT"],
// 1 16 20 -.25 -20 4 0 0 0 .25 0 0 0 -4 1-4cylo.dat
  [1,16,20,-.25,-20,4,0,0,0,.25,0,0,0,-4, ldraw_lib__1_4cylo(realsolid)],
// 0 BFC INVERTNEXT
  [0,"BFC","INVERTNEXT"],
// 1 16 -20 -.25 -20 -4 0 0 0 .25 0 0 0 -4 1-4cylo.dat
  [1,16,-20,-.25,-20,-4,0,0,0,.25,0,0,0,-4, ldraw_lib__1_4cylo(realsolid)],
// 
// 1 16 61 -.25 61 4 0 0 0 .25 0 0 0 4 1-4cylo.dat
  [1,16,61,-.25,61,4,0,0,0,.25,0,0,0,4, ldraw_lib__1_4cylo(realsolid)],
// 1 16 -61 -.25 61 -4 0 0 0 .25 0 0 0 4 1-4cylo.dat
  [1,16,-61,-.25,61,-4,0,0,0,.25,0,0,0,4, ldraw_lib__1_4cylo(realsolid)],
// 1 16 61 -.25 -61 4 0 0 0 .25 0 0 0 -4 1-4cylo.dat
  [1,16,61,-.25,-61,4,0,0,0,.25,0,0,0,-4, ldraw_lib__1_4cylo(realsolid)],
// 1 16 -61 -.25 -61 -4 0 0 0 .25 0 0 0 -4 1-4cylo.dat
  [1,16,-61,-.25,-61,-4,0,0,0,.25,0,0,0,-4, ldraw_lib__1_4cylo(realsolid)],
// 
// 1 16 0 -.125 65 -61 0 0 0 0 -.125 0 -1 0 rect2p.dat
  [1,16,0,-.125,65,-61,0,0,0,0,-.125,0,-1,0, ldraw_lib__rect2p(realsolid)],
// 1 16 0 -.125 24 -20 0 0 0 0 .125 0 1 0 rect2p.dat
  [1,16,0,-.125,24,-20,0,0,0,0,.125,0,1,0, ldraw_lib__rect2p(realsolid)],
// 1 16 65 -.125 0 0 -1 0 0 0 -.125 61 0 0 rect2p.dat
  [1,16,65,-.125,0,0,-1,0,0,0,-.125,61,0,0, ldraw_lib__rect2p(realsolid)],
// 1 16 24 -.125 0 0 1 0 0 0 .125 20 0 0 rect2p.dat
  [1,16,24,-.125,0,0,1,0,0,0,.125,20,0,0, ldraw_lib__rect2p(realsolid)],
// 1 16 0 -.125 -65 61 0 0 0 0 -.125 0 1 0 rect2p.dat
  [1,16,0,-.125,-65,61,0,0,0,0,-.125,0,1,0, ldraw_lib__rect2p(realsolid)],
// 1 16 0 -.125 -24 20 0 0 0 0 .125 0 -1 0 rect2p.dat
  [1,16,0,-.125,-24,20,0,0,0,0,.125,0,-1,0, ldraw_lib__rect2p(realsolid)],
// 1 16 -65 -.125 0 0 1 0 0 0 -.125 -61 0 0 rect2p.dat
  [1,16,-65,-.125,0,0,1,0,0,0,-.125,-61,0,0, ldraw_lib__rect2p(realsolid)],
// 1 16 -24 -.125 0 0 -1 0 0 0 .125 -20 0 0 rect2p.dat
  [1,16,-24,-.125,0,0,-1,0,0,0,.125,-20,0,0, ldraw_lib__rect2p(realsolid)],
// 
// 1 16 20 -.25 20 4 0 0 0 1 0 0 0 4 1-4ndis.dat
  [1,16,20,-.25,20,4,0,0,0,1,0,0,0,4, ldraw_lib__1_4ndis(realsolid)],
// 1 16 -20 -.25 20 -4 0 0 0 1 0 0 0 4 1-4ndis.dat
  [1,16,-20,-.25,20,-4,0,0,0,1,0,0,0,4, ldraw_lib__1_4ndis(realsolid)],
// 1 16 20 -.25 -20 4 0 0 0 1 0 0 0 -4 1-4ndis.dat
  [1,16,20,-.25,-20,4,0,0,0,1,0,0,0,-4, ldraw_lib__1_4ndis(realsolid)],
// 1 16 -20 -.25 -20 -4 0 0 0 1 0 0 0 -4 1-4ndis.dat
  [1,16,-20,-.25,-20,-4,0,0,0,1,0,0,0,-4, ldraw_lib__1_4ndis(realsolid)],
// 1 16 61 -.25 61 4 0 0 0 1 0 0 0 4 1-4chrd.dat
  [1,16,61,-.25,61,4,0,0,0,1,0,0,0,4, ldraw_lib__1_4chrd(realsolid)],
// 1 16 -61 -.25 61 -4 0 0 0 1 0 0 0 4 1-4chrd.dat
  [1,16,-61,-.25,61,-4,0,0,0,1,0,0,0,4, ldraw_lib__1_4chrd(realsolid)],
// 1 16 61 -.25 -61 4 0 0 0 1 0 0 0 -4 1-4chrd.dat
  [1,16,61,-.25,-61,4,0,0,0,1,0,0,0,-4, ldraw_lib__1_4chrd(realsolid)],
// 1 16 -61 -.25 -61 -4 0 0 0 1 0 0 0 -4 1-4chrd.dat
  [1,16,-61,-.25,-61,-4,0,0,0,1,0,0,0,-4, ldraw_lib__1_4chrd(realsolid)],
// 4 16 -20 -0.25 24 20 -0.25 24 61 -0.25 65 -61 -0.25 65
  [4,16,-20,-0.25,24,20,-0.25,24,61,-0.25,65,-61,-0.25,65],
// 4 16 -24 -0.25 24 -20 -0.25 24 -61 -0.25 65 -65 -0.25 61
  [4,16,-24,-0.25,24,-20,-0.25,24,-61,-0.25,65,-65,-0.25,61],
// 3 16 -24 -0.25 20 -24 -0.25 24 -65 -0.25 61
  [3,16,-24,-0.25,20,-24,-0.25,24,-65,-0.25,61],
// 4 16 24 -0.25 20 24 -0.25 -20 65 -0.25 -61 65 -0.25 61
  [4,16,24,-0.25,20,24,-0.25,-20,65,-0.25,-61,65,-0.25,61],
// 4 16 24 -0.25 24 24 -0.25 20 65 -0.25 61 61 -0.25 65
  [4,16,24,-0.25,24,24,-0.25,20,65,-0.25,61,61,-0.25,65],
// 3 16 20 -0.25 24 24 -0.25 24 61 -0.25 65
  [3,16,20,-0.25,24,24,-0.25,24,61,-0.25,65],
// 4 16 20 -0.25 -24 -20 -0.25 -24 -61 -0.25 -65 61 -0.25 -65
  [4,16,20,-0.25,-24,-20,-0.25,-24,-61,-0.25,-65,61,-0.25,-65],
// 4 16 24 -0.25 -24 20 -0.25 -24 61 -0.25 -65 65 -0.25 -61
  [4,16,24,-0.25,-24,20,-0.25,-24,61,-0.25,-65,65,-0.25,-61],
// 3 16 24 -0.25 -20 24 -0.25 -24 65 -0.25 -61
  [3,16,24,-0.25,-20,24,-0.25,-24,65,-0.25,-61],
// 4 16 -24 -0.25 -20 -24 -0.25 20 -65 -0.25 61 -65 -0.25 -61
  [4,16,-24,-0.25,-20,-24,-0.25,20,-65,-0.25,61,-65,-0.25,-61],
// 4 16 -24 -0.25 -24 -24 -0.25 -20 -65 -0.25 -61 -61 -0.25 -65
  [4,16,-24,-0.25,-24,-24,-0.25,-20,-65,-0.25,-61,-61,-0.25,-65],
// 3 16 -20 -0.25 -24 -24 -0.25 -24 -61 -0.25 -65
  [3,16,-20,-0.25,-24,-24,-0.25,-24,-61,-0.25,-65],
// 
// 1 16 20 0 20 4 0 0 0 -1 0 0 0 4 1-4ndis.dat
  [1,16,20,0,20,4,0,0,0,-1,0,0,0,4, ldraw_lib__1_4ndis(realsolid)],
// 1 16 -20 0 20 -4 0 0 0 -1 0 0 0 4 1-4ndis.dat
  [1,16,-20,0,20,-4,0,0,0,-1,0,0,0,4, ldraw_lib__1_4ndis(realsolid)],
// 1 16 20 0 -20 4 0 0 0 -1 0 0 0 -4 1-4ndis.dat
  [1,16,20,0,-20,4,0,0,0,-1,0,0,0,-4, ldraw_lib__1_4ndis(realsolid)],
// 1 16 -20 0 -20 -4 0 0 0 -1 0 0 0 -4 1-4ndis.dat
  [1,16,-20,0,-20,-4,0,0,0,-1,0,0,0,-4, ldraw_lib__1_4ndis(realsolid)],
// 1 16 61 0 61 4 0 0 0 -1 0 0 0 4 1-4chrd.dat
  [1,16,61,0,61,4,0,0,0,-1,0,0,0,4, ldraw_lib__1_4chrd(realsolid)],
// 1 16 -61 0 61 -4 0 0 0 -1 0 0 0 4 1-4chrd.dat
  [1,16,-61,0,61,-4,0,0,0,-1,0,0,0,4, ldraw_lib__1_4chrd(realsolid)],
// 1 16 61 0 -61 4 0 0 0 -1 0 0 0 -4 1-4chrd.dat
  [1,16,61,0,-61,4,0,0,0,-1,0,0,0,-4, ldraw_lib__1_4chrd(realsolid)],
// 1 16 -61 0 -61 -4 0 0 0 -1 0 0 0 -4 1-4chrd.dat
  [1,16,-61,0,-61,-4,0,0,0,-1,0,0,0,-4, ldraw_lib__1_4chrd(realsolid)],
// 4 16 61 0 65 20 0 24 -20 0 24 -61 0 65
  [4,16,61,0,65,20,0,24,-20,0,24,-61,0,65],
// 4 16 -61 0 65 -20 0 24 -24 0 24 -65 0 61
  [4,16,-61,0,65,-20,0,24,-24,0,24,-65,0,61],
// 3 16 -24 0 24 -24 0 20 -65 0 61
  [3,16,-24,0,24,-24,0,20,-65,0,61],
// 4 16 65 0 -61 24 0 -20 24 0 20 65 0 61
  [4,16,65,0,-61,24,0,-20,24,0,20,65,0,61],
// 4 16 65 0 61 24 0 20 24 0 24 61 0 65
  [4,16,65,0,61,24,0,20,24,0,24,61,0,65],
// 3 16 24 0 24 20 0 24 61 0 65
  [3,16,24,0,24,20,0,24,61,0,65],
// 4 16 -61 0 -65 -20 0 -24 20 0 -24 61 0 -65
  [4,16,-61,0,-65,-20,0,-24,20,0,-24,61,0,-65],
// 4 16 61 0 -65 20 0 -24 24 0 -24 65 0 -61
  [4,16,61,0,-65,20,0,-24,24,0,-24,65,0,-61],
// 3 16 24 0 -24 24 0 -20 65 0 -61
  [3,16,24,0,-24,24,0,-20,65,0,-61],
// 4 16 -65 0 61 -24 0 20 -24 0 -20 -65 0 -61
  [4,16,-65,0,61,-24,0,20,-24,0,-20,-65,0,-61],
// 4 16 -65 0 -61 -24 0 -20 -24 0 -24 -61 0 -65
  [4,16,-65,0,-61,-24,0,-20,-24,0,-24,-61,0,-65],
// 3 16 -24 0 -24 -20 0 -24 -61 0 -65
  [3,16,-24,0,-24,-20,0,-24,-61,0,-65],
];
module ldraw_lib__u9445(step=0, col=false, unit=2/5, alt=false, line=0.2, solid=!$preview)
    makepoly(ldraw_lib__u9445(solid), step=step, col=col, unit=unit, alt=alt, line=line, solid=solid);
ldraw_lib__u9445(line=0.2);
